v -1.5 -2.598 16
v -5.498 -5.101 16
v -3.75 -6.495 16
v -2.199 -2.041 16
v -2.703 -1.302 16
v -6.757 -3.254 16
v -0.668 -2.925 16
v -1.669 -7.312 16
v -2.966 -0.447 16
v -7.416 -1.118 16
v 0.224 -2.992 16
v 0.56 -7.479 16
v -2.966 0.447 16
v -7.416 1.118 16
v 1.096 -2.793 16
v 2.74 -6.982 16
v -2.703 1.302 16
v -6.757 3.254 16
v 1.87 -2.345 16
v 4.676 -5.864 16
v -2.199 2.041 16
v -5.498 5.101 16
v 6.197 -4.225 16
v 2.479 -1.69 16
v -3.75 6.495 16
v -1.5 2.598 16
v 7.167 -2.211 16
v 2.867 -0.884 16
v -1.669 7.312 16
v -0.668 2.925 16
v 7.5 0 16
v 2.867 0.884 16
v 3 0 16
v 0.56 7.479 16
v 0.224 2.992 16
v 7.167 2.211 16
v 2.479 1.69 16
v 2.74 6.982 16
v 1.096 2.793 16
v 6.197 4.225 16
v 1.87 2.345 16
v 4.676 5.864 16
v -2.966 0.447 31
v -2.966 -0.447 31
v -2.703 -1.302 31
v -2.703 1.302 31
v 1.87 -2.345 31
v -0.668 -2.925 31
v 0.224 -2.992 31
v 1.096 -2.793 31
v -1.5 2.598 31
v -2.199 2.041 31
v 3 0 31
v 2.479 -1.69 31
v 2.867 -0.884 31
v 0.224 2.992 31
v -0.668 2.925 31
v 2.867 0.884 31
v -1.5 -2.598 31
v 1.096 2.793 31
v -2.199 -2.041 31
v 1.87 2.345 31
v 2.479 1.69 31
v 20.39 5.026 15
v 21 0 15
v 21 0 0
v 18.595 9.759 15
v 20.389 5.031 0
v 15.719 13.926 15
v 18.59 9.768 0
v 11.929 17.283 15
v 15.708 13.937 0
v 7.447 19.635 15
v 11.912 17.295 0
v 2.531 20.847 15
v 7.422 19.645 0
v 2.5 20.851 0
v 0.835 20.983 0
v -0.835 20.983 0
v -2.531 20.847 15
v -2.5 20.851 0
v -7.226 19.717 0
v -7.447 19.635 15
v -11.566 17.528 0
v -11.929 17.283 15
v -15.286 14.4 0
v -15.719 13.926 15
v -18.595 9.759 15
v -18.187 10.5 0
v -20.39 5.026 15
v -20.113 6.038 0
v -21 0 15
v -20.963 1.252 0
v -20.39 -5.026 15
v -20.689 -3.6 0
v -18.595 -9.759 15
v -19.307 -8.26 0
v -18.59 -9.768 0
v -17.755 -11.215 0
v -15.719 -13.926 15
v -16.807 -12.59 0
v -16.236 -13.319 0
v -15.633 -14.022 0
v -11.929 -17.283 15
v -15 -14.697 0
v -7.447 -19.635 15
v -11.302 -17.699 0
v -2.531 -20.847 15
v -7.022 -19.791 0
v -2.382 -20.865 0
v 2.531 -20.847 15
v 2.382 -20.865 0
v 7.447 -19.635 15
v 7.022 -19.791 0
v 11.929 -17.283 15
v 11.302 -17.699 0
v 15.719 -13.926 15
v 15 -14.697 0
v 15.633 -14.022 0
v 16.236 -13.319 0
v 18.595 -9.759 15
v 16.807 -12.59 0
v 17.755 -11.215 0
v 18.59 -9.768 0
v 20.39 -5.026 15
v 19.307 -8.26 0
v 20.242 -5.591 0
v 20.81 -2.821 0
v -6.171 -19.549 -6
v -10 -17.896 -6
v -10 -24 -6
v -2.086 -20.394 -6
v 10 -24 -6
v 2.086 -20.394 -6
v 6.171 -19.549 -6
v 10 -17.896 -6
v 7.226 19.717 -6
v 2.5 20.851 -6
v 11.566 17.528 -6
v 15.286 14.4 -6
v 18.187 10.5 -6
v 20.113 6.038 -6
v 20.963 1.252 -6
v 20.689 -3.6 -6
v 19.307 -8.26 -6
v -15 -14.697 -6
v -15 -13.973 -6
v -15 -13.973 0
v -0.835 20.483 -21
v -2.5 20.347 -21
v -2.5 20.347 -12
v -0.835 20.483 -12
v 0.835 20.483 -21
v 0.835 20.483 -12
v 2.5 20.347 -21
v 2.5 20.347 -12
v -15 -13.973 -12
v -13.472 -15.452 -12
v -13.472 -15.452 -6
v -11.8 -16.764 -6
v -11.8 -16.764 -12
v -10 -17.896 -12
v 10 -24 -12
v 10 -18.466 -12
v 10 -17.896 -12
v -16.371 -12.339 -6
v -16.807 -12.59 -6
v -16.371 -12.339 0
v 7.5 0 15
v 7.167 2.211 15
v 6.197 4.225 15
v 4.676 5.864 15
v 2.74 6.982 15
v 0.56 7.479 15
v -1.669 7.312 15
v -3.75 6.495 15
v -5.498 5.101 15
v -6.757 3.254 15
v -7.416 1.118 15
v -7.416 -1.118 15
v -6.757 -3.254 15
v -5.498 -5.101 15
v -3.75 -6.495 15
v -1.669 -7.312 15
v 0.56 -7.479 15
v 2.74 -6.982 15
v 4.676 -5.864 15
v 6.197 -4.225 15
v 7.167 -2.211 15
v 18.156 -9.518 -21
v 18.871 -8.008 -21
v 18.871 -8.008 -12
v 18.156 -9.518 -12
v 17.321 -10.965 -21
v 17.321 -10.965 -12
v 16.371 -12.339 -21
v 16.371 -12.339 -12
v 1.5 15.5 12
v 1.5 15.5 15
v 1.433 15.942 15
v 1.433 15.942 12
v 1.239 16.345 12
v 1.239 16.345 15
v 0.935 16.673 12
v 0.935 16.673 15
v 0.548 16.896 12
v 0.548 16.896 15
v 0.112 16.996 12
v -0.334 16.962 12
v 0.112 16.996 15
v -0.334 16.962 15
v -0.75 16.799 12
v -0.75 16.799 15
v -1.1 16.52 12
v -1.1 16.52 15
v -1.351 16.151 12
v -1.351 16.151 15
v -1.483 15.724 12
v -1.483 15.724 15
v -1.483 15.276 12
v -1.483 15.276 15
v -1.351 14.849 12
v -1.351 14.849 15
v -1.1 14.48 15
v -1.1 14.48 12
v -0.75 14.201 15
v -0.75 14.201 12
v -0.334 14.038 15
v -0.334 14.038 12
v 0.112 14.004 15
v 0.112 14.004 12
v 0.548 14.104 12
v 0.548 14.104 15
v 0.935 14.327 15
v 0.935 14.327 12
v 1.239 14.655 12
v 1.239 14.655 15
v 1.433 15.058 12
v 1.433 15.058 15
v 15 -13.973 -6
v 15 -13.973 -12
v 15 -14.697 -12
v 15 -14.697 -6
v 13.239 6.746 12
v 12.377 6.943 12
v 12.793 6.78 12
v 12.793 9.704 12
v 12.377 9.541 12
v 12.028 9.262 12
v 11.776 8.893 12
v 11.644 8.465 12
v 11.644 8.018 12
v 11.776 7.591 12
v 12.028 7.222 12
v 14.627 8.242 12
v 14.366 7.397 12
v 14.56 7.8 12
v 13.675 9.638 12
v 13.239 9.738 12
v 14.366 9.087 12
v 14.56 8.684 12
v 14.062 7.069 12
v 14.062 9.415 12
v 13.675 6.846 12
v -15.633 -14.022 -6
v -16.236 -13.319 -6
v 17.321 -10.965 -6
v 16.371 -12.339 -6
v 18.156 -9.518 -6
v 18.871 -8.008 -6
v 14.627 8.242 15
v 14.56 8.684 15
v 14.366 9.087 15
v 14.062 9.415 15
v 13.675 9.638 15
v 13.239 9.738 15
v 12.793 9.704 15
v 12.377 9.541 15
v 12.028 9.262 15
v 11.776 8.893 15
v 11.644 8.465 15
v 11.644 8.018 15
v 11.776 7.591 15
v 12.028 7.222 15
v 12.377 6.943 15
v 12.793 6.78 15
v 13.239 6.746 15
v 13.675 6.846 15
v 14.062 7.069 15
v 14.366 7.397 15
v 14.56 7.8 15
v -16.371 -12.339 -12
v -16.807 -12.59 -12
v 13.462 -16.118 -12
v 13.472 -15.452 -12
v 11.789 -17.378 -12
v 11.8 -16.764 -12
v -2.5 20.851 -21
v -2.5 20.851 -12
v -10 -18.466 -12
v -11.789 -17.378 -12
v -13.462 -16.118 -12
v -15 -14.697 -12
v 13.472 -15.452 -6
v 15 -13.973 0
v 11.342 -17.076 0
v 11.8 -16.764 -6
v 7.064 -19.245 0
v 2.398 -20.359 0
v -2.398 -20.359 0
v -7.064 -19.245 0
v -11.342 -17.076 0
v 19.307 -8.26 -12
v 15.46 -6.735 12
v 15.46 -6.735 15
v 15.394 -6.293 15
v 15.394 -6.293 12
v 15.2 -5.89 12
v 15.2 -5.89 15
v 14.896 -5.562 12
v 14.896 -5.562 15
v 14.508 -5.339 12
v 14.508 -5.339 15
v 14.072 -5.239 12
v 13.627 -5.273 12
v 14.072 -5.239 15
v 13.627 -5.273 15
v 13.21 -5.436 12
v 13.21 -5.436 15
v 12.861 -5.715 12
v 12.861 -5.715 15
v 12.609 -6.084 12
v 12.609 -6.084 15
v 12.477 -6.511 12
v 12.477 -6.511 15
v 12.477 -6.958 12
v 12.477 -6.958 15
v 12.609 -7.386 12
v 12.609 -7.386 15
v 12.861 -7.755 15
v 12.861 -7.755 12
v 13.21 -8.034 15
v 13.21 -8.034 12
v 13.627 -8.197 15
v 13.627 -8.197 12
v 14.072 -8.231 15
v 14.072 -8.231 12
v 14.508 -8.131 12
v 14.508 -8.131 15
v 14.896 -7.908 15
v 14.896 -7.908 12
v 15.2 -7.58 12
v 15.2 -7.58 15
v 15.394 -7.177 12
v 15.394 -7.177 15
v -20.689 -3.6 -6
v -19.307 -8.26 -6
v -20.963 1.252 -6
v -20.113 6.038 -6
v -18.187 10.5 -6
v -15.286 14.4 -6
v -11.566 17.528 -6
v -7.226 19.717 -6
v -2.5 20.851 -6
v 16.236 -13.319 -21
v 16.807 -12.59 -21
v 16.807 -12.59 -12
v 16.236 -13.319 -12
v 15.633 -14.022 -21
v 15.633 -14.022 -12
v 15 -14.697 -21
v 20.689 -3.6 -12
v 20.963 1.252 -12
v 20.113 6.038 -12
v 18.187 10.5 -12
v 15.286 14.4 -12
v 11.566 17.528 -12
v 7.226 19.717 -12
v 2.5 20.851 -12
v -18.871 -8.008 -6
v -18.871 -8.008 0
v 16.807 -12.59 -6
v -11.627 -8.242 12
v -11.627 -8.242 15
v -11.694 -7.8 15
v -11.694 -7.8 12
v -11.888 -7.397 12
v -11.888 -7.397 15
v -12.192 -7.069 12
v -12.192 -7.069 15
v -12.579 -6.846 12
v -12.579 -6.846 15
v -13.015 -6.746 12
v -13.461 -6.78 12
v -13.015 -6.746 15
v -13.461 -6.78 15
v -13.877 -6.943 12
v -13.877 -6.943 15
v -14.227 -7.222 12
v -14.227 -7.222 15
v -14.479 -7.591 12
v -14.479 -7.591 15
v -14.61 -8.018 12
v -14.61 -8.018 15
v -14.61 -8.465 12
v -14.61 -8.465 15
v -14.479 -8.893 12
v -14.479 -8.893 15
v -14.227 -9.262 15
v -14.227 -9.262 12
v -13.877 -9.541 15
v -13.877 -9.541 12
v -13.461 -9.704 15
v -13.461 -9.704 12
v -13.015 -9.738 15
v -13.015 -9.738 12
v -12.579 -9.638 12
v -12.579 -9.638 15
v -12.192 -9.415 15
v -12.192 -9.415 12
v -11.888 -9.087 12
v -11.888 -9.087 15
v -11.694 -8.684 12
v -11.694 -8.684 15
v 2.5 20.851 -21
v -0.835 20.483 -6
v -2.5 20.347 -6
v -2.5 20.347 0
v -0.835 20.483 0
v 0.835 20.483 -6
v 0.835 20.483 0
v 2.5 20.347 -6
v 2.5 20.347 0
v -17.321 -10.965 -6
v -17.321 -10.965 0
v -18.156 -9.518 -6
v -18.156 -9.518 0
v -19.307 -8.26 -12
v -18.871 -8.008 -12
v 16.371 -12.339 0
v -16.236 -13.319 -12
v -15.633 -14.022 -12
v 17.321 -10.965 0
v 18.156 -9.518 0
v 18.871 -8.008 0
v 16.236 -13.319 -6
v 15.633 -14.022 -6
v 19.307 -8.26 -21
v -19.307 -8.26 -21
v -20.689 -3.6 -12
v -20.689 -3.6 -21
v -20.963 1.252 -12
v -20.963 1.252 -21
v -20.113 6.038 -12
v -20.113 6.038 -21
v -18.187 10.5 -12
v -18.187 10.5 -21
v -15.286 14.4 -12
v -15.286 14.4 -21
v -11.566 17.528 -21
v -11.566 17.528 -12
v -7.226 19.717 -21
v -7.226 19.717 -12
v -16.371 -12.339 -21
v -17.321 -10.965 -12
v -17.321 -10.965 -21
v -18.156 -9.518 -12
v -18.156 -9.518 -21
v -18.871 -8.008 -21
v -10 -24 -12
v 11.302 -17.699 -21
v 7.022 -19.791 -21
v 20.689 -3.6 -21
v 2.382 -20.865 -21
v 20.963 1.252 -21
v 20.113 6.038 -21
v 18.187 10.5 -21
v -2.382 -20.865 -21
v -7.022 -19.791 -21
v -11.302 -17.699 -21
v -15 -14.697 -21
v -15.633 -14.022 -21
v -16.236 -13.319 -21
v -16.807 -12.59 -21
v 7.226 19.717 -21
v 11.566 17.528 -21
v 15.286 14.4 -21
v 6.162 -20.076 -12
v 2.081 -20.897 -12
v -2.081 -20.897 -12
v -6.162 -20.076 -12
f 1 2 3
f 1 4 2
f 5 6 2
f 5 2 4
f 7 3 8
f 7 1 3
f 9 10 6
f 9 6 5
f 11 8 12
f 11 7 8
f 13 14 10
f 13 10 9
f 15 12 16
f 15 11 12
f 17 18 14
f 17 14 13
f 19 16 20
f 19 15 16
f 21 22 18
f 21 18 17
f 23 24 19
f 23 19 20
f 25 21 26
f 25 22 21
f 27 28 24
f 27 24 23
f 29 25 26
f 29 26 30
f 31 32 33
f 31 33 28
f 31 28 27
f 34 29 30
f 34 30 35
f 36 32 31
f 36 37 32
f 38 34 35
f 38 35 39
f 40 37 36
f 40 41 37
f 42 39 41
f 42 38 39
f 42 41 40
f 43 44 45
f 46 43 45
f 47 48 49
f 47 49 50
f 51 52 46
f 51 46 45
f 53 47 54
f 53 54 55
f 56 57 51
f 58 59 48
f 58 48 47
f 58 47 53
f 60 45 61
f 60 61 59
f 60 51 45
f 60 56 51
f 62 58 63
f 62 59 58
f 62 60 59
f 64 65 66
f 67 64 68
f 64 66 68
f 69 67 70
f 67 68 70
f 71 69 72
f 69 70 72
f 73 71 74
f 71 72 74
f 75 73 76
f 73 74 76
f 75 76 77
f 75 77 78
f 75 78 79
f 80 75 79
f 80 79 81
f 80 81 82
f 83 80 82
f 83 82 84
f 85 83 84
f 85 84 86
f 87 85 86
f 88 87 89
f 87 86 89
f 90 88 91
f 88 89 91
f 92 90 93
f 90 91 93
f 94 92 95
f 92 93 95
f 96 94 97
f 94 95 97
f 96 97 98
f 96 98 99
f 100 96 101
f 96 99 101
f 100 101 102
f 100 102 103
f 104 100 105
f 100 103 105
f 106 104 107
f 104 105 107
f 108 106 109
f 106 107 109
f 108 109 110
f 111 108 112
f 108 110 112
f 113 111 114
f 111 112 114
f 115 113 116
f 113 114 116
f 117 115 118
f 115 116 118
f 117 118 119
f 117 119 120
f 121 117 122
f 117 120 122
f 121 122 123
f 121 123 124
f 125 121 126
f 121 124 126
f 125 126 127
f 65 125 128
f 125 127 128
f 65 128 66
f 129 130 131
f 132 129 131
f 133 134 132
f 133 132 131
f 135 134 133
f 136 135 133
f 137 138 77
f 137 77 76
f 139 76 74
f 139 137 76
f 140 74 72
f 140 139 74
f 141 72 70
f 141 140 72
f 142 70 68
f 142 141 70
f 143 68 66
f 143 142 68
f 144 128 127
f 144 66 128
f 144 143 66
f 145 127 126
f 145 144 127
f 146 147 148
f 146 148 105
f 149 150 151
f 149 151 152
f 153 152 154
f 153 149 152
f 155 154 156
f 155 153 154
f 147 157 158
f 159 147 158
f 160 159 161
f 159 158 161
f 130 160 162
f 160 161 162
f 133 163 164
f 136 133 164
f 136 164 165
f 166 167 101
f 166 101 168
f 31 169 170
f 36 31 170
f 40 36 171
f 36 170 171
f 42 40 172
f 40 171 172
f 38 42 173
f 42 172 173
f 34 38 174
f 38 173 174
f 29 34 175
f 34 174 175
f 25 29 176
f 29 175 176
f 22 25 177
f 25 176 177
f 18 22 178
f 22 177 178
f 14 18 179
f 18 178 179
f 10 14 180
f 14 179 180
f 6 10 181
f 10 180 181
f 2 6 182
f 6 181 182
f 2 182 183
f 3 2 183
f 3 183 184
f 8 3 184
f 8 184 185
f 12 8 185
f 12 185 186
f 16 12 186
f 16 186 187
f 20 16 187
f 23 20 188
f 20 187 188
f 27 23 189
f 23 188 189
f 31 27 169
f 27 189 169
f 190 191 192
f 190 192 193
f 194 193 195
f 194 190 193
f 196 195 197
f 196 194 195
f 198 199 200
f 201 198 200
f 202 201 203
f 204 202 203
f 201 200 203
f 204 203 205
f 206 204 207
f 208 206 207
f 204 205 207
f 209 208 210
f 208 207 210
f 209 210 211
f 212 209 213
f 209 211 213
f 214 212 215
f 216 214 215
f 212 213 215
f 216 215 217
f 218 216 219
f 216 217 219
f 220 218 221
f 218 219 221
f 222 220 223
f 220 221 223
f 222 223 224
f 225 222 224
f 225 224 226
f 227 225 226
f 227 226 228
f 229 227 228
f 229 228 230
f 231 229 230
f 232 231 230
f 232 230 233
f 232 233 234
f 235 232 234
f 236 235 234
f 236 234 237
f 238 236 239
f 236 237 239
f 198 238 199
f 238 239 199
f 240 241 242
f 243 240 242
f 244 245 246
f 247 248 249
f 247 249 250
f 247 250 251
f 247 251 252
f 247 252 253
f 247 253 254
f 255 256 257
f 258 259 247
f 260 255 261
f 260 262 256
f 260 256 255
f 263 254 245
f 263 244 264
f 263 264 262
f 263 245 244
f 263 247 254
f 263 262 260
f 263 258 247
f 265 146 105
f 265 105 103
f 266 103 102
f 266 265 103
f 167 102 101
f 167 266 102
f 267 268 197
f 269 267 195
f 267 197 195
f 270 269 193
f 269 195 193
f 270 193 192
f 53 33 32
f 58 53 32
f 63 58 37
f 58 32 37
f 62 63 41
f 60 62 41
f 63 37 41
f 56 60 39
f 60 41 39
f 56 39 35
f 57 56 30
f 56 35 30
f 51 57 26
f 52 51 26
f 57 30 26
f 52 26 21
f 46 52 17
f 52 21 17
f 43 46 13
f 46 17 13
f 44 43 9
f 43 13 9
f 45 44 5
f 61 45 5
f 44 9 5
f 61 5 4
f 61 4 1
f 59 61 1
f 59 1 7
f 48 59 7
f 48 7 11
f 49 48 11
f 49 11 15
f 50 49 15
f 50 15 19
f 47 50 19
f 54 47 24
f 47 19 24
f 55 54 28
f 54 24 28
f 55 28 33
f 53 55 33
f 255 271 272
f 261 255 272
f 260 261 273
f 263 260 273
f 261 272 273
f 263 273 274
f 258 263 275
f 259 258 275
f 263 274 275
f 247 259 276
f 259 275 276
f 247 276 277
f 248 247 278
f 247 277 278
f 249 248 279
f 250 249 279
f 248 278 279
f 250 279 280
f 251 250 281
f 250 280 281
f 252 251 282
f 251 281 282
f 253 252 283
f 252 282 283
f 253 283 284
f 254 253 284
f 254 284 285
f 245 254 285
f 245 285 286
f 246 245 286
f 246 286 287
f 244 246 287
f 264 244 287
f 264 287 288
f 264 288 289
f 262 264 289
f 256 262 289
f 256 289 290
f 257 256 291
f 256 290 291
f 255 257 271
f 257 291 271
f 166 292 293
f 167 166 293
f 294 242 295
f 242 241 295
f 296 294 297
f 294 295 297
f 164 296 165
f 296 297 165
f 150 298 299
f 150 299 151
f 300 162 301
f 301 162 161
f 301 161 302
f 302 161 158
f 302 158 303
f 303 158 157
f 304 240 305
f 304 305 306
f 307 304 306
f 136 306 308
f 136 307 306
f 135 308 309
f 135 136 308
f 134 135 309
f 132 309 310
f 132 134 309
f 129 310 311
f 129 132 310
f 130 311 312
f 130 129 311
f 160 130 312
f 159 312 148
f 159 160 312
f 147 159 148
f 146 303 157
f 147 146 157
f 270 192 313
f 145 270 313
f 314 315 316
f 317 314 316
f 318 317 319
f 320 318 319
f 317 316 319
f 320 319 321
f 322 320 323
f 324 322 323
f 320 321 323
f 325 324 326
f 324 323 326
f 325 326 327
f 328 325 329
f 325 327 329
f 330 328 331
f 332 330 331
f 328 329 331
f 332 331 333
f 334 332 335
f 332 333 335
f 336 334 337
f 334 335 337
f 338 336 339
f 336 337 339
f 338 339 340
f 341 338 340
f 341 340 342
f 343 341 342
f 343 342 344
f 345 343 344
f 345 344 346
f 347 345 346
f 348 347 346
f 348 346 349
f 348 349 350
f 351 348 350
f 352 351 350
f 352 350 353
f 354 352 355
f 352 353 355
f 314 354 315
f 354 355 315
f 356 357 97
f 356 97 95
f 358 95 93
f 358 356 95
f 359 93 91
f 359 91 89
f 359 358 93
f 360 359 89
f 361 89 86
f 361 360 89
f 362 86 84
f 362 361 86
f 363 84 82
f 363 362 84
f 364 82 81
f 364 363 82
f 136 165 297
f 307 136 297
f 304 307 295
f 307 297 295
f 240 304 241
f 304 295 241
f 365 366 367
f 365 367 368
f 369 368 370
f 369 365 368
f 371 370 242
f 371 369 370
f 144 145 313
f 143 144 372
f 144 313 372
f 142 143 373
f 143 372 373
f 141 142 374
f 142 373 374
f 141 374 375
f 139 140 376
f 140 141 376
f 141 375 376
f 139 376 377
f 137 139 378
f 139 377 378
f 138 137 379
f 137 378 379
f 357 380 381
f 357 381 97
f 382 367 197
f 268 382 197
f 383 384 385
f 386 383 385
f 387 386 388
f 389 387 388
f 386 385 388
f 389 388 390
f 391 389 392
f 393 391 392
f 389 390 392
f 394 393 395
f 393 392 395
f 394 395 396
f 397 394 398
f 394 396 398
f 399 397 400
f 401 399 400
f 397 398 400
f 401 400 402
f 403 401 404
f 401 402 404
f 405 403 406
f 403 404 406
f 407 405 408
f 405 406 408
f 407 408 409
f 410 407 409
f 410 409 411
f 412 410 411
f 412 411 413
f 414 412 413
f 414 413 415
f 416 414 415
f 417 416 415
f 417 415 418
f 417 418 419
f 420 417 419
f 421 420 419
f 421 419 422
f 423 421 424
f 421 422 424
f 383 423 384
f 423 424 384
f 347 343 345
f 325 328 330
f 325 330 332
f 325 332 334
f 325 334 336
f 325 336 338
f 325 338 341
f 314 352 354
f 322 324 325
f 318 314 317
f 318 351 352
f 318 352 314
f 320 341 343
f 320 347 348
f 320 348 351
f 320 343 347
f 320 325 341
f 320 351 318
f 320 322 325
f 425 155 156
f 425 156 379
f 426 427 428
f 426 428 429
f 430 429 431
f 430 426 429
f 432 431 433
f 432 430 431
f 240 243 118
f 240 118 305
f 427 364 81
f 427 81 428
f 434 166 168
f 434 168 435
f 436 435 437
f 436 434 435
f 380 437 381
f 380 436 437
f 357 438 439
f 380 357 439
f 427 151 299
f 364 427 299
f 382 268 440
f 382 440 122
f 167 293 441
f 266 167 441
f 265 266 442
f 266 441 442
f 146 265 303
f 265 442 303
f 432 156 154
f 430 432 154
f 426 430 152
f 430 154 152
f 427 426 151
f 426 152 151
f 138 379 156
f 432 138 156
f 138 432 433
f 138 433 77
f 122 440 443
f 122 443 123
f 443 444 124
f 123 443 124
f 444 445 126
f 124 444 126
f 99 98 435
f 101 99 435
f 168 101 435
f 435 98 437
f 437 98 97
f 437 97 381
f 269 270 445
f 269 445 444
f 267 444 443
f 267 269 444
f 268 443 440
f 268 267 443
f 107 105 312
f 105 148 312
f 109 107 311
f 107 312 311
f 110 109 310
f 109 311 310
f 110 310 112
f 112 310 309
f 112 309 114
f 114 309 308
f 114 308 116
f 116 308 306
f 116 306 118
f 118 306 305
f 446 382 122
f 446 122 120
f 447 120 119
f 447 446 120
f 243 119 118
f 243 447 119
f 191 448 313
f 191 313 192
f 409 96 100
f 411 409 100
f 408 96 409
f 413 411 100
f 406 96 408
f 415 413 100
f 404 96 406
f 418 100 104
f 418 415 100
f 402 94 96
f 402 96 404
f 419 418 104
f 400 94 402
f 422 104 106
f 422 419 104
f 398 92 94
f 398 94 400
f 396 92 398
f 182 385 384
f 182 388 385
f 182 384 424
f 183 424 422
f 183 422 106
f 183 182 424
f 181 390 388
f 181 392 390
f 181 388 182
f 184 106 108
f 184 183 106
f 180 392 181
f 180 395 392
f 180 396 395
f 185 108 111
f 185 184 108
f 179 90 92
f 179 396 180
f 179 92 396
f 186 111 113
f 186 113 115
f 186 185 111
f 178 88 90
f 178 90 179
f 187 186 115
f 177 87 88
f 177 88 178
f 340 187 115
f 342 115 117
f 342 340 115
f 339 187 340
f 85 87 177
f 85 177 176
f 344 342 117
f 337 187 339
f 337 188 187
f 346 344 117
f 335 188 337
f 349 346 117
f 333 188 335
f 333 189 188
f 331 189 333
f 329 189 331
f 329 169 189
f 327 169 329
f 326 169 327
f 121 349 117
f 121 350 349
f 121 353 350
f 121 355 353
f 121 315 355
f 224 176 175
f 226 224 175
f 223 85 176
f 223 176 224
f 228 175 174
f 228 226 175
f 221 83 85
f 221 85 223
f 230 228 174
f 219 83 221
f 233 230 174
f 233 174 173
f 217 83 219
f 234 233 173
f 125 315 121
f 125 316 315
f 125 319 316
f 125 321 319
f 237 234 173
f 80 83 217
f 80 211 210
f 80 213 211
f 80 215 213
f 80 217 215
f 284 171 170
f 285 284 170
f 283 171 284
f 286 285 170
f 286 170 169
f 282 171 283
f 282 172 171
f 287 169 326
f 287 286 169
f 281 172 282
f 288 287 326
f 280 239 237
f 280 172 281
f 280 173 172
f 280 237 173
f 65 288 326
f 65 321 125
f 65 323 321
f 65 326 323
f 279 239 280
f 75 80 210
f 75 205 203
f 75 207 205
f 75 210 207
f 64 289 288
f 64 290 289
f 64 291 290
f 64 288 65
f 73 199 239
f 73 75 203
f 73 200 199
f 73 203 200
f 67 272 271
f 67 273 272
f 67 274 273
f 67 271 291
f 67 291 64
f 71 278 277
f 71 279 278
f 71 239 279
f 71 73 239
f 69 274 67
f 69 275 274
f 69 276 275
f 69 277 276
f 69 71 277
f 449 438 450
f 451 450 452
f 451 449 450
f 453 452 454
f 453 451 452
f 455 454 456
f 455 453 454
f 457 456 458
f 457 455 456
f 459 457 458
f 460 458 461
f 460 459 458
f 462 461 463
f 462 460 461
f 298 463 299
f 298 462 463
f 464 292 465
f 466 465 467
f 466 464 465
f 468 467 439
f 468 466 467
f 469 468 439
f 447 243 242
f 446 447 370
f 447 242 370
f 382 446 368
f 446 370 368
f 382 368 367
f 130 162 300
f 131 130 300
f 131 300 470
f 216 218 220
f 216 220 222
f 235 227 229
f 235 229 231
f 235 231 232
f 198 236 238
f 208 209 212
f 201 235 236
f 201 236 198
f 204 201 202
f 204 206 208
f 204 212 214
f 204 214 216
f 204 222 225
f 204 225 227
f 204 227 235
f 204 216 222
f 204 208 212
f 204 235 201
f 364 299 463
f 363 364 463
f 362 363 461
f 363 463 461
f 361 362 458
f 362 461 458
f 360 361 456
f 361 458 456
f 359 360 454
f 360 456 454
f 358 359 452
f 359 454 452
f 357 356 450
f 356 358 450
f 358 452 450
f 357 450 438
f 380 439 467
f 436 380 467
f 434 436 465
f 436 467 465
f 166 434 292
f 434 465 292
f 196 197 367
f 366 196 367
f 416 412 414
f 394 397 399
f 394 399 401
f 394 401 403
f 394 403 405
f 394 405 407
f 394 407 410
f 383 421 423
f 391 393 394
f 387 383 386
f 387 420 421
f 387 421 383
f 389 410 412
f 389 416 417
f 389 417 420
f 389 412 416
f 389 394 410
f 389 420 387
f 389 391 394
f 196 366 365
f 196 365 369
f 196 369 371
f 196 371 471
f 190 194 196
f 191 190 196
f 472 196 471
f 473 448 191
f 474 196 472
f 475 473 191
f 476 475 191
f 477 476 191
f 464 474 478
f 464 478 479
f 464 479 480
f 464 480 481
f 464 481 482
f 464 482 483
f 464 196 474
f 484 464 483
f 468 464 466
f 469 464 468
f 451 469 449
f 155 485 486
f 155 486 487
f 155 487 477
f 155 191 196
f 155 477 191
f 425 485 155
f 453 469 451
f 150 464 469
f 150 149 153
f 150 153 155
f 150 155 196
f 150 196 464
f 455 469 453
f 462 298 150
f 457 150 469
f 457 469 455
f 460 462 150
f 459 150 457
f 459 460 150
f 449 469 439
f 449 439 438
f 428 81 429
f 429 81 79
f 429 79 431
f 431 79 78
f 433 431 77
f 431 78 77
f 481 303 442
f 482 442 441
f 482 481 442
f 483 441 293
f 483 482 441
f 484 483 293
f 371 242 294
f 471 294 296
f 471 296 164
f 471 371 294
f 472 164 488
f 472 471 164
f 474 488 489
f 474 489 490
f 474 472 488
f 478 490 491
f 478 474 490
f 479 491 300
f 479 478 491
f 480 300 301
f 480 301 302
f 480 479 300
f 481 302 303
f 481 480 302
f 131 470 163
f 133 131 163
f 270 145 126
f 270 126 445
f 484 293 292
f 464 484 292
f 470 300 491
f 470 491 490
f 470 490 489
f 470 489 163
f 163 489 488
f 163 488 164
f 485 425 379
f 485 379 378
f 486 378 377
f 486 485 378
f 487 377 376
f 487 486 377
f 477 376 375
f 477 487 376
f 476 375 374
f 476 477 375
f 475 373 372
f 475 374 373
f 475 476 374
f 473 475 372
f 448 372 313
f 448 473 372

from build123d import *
from build123d.topology import SkipClean

# Parameters (mm, degrees)
SKETCH_1_R          = 21
EXTRUDE_1_DEPTH     = 15
EXTRUDE_START       = 6
EXTRUDE_2_DEPTH     = 6
EXTRUDE_3_DEPTH     = 6
EXTRUDE_START_2     = 9
EXTRUDE_4_DEPTH     = 9
SKETCH_6_R          = 7.5
EXTRUDE_5_DEPTH     = 1
SKETCH_7_R          = 3
EXTRUDE_6_DEPTH     = 15
SKETCH_8_R          = 1.5
CUT_EXTRUDE_1_DEPTH = 3


with BuildPart() as part:
    # 草图1 → 凸台-拉伸1 (new body)
    with BuildSketch(Plane.XY):
        Circle(SKETCH_1_R)
    extrude(amount=EXTRUDE_1_DEPTH)

    # 草图2 → 凸台-拉伸2 (add)
    with SkipClean():  # the faces are left unmerged after this step: merging them gives an invalid solid
        with BuildSketch(Plane(origin=(0, 0, 0), x_dir=(-1, 0, 0), z_dir=(0, 0, -1)).offset(EXTRUDE_START)):
            with BuildLine():
                Line((2.5, 20.850659462), (2.5, 20.346989949))
                ThreePointArc((2.5, 20.346989949), (0, 20.5), (-2.5, 20.346989949))
                Line((-2.5, 20.346989949), (-2.5, 20.850659462))
                ThreePointArc((-2.5, 20.850659462), (-18.186533479, 10.5), (-19.30720078, -8.260266222))
                Line((-19.30720078, -8.260266222), (-18.871010187, -8.008431465))
                ThreePointArc((-18.871010187, -8.008431465), (-17.753520778, -10.25), (-16.371010187, -12.338558484))
                Line((-16.371010187, -12.338558484), (-16.80720078, -12.59039324))
                ThreePointArc((-16.80720078, -12.59039324), (-15.938440593, -13.673555187), (-15, -14.696938457))
                Line((-15, -14.696938457), (-15, -13.973188612))
                ThreePointArc((-15, -13.973188612), (0, -20.5), (15, -13.973188612))
                Line((15, -13.973188612), (15, -14.696938457))
                ThreePointArc((15, -14.696938457), (15.938440593, -13.673555187), (16.80720078, -12.59039324))
                Line((16.80720078, -12.59039324), (16.371010187, -12.338558484))
                ThreePointArc((16.371010187, -12.338558484), (17.753520778, -10.25), (18.871010187, -8.008431465))
                Line((18.871010187, -8.008431465), (19.30720078, -8.260266222))
                ThreePointArc((19.30720078, -8.260266222), (18.186533479, 10.5), (2.5, 20.850659462))
            make_face()
        extrude(amount=-EXTRUDE_2_DEPTH)

    # 草图4 → 凸台-拉伸3 (add)
    with SkipClean():  # the faces are left unmerged after this step: merging them gives an invalid solid
        with BuildSketch(Plane(origin=(0, 0, -6), x_dir=(-1, 0, 0), z_dir=(0, 0, -1)).offset(EXTRUDE_START)):
            with BuildLine():
                Line((10, -17.895530168), (10, -24))
                Line((10, -24), (-10, -24))
                Line((-10, -24), (-10, -17.895530168))
                ThreePointArc((-10, -17.895530168), (-12.652912345, -16.129284212), (-15, -13.973188612))
                Line((-15, -13.973188612), (-15, -14.696938457))
                ThreePointArc((-15, -14.696938457), (-15.938440593, -13.673555187), (-16.80720078, -12.59039324))
                Line((-16.80720078, -12.59039324), (-16.371010187, -12.338558484))
                ThreePointArc((-16.371010187, -12.338558484), (-17.753520778, -10.25), (-18.871010187, -8.008431465))
                Line((-18.871010187, -8.008431465), (-19.30720078, -8.260266222))
                ThreePointArc((-19.30720078, -8.260266222), (-18.186533479, 10.5), (-2.5, 20.850659462))
                Line((-2.5, 20.850659462), (-2.5, 20.346989949))
                ThreePointArc((-2.5, 20.346989949), (0, 20.5), (2.5, 20.346989949))
                Line((2.5, 20.346989949), (2.5, 20.850659462))
                ThreePointArc((2.5, 20.850659462), (18.186533479, 10.5), (19.30720078, -8.260266222))
                Line((19.30720078, -8.260266222), (18.871010187, -8.008431465))
                ThreePointArc((18.871010187, -8.008431465), (17.753520778, -10.25), (16.371010187, -12.338558484))
                Line((16.371010187, -12.338558484), (16.80720078, -12.59039324))
                ThreePointArc((16.80720078, -12.59039324), (15.938440593, -13.673555187), (15, -14.696938457))
                Line((15, -14.696938457), (15, -13.973188612))
                ThreePointArc((15, -13.973188612), (12.652912345, -16.129284212), (10, -17.895530168))
            make_face()
        extrude(amount=-EXTRUDE_3_DEPTH)

    # 草图5 → 凸台-拉伸4 (add)
    with SkipClean():  # the faces are left unmerged after this step: merging them gives an invalid solid
        with BuildSketch(Plane(origin=(0, 0, -12), x_dir=(-1, 0, 0), z_dir=(0, 0, -1)).offset(EXTRUDE_START_2)):
            with BuildLine():
                Line((18.871010187, -8.008431465), (19.30720078, -8.260266222))
                ThreePointArc((19.30720078, -8.260266222), (18.186533479, 10.5), (2.5, 20.850659462))
                Line((2.5, 20.850659462), (2.5, 20.346989949))
                ThreePointArc((2.5, 20.346989949), (0, 20.5), (-2.5, 20.346989949))
                Line((-2.5, 20.346989949), (-2.5, 20.850659462))
                ThreePointArc((-2.5, 20.850659462), (-18.186533479, 10.5), (-19.30720078, -8.260266222))
                Line((-19.30720078, -8.260266222), (-18.871010187, -8.008431465))
                ThreePointArc((-18.871010187, -8.008431465), (-17.753520778, -10.25), (-16.371010187, -12.338558484))
                Line((-16.371010187, -12.338558484), (-16.80720078, -12.59039324))
                ThreePointArc((-16.80720078, -12.59039324), (-15.938440593, -13.673555187), (-15, -14.696938457))
                ThreePointArc((-15, -14.696938457), (0, -21), (15, -14.696938457))
                ThreePointArc((15, -14.696938457), (15.938440593, -13.673555187), (16.80720078, -12.59039324))
                Line((16.80720078, -12.59039324), (16.371010187, -12.338558484))
                ThreePointArc((16.371010187, -12.338558484), (17.753520778, -10.25), (18.871010187, -8.008431465))
            make_face()
        extrude(amount=-EXTRUDE_4_DEPTH)

    # 草图6 → 凸台-拉伸5 (add)
    with SkipClean():  # the faces are left unmerged after this step: merging them gives an invalid solid
        with BuildSketch(Plane.XY.offset(15)):
            Circle(SKETCH_6_R)
        extrude(amount=EXTRUDE_5_DEPTH)

    # 草图7 → 凸台-拉伸6 (add)
    with SkipClean():  # the faces are left unmerged after this step: merging them gives an invalid solid
        with BuildSketch(Plane.XY.offset(16)):
            Circle(SKETCH_7_R)
        extrude(amount=EXTRUDE_6_DEPTH)

    # 草图8 → 切除-拉伸1 (cut)
    with SkipClean():  # the faces are left unmerged after this step: merging them gives an invalid solid
        with BuildSketch(Plane.XY.offset(15)):
            with Locations((0, 15.5)):
                Circle(SKETCH_8_R)
            with Locations((13.12709029, 8.241935484)):
                Circle(SKETCH_8_R)
            with Locations((13.960339517, -6.734903159)):
                Circle(SKETCH_8_R)
            with Locations((-13.12709029, -8.241935484)):
                Circle(SKETCH_8_R)
        extrude(amount=-CUT_EXTRUDE_1_DEPTH, mode=Mode.SUBTRACT)


solid = part.part
